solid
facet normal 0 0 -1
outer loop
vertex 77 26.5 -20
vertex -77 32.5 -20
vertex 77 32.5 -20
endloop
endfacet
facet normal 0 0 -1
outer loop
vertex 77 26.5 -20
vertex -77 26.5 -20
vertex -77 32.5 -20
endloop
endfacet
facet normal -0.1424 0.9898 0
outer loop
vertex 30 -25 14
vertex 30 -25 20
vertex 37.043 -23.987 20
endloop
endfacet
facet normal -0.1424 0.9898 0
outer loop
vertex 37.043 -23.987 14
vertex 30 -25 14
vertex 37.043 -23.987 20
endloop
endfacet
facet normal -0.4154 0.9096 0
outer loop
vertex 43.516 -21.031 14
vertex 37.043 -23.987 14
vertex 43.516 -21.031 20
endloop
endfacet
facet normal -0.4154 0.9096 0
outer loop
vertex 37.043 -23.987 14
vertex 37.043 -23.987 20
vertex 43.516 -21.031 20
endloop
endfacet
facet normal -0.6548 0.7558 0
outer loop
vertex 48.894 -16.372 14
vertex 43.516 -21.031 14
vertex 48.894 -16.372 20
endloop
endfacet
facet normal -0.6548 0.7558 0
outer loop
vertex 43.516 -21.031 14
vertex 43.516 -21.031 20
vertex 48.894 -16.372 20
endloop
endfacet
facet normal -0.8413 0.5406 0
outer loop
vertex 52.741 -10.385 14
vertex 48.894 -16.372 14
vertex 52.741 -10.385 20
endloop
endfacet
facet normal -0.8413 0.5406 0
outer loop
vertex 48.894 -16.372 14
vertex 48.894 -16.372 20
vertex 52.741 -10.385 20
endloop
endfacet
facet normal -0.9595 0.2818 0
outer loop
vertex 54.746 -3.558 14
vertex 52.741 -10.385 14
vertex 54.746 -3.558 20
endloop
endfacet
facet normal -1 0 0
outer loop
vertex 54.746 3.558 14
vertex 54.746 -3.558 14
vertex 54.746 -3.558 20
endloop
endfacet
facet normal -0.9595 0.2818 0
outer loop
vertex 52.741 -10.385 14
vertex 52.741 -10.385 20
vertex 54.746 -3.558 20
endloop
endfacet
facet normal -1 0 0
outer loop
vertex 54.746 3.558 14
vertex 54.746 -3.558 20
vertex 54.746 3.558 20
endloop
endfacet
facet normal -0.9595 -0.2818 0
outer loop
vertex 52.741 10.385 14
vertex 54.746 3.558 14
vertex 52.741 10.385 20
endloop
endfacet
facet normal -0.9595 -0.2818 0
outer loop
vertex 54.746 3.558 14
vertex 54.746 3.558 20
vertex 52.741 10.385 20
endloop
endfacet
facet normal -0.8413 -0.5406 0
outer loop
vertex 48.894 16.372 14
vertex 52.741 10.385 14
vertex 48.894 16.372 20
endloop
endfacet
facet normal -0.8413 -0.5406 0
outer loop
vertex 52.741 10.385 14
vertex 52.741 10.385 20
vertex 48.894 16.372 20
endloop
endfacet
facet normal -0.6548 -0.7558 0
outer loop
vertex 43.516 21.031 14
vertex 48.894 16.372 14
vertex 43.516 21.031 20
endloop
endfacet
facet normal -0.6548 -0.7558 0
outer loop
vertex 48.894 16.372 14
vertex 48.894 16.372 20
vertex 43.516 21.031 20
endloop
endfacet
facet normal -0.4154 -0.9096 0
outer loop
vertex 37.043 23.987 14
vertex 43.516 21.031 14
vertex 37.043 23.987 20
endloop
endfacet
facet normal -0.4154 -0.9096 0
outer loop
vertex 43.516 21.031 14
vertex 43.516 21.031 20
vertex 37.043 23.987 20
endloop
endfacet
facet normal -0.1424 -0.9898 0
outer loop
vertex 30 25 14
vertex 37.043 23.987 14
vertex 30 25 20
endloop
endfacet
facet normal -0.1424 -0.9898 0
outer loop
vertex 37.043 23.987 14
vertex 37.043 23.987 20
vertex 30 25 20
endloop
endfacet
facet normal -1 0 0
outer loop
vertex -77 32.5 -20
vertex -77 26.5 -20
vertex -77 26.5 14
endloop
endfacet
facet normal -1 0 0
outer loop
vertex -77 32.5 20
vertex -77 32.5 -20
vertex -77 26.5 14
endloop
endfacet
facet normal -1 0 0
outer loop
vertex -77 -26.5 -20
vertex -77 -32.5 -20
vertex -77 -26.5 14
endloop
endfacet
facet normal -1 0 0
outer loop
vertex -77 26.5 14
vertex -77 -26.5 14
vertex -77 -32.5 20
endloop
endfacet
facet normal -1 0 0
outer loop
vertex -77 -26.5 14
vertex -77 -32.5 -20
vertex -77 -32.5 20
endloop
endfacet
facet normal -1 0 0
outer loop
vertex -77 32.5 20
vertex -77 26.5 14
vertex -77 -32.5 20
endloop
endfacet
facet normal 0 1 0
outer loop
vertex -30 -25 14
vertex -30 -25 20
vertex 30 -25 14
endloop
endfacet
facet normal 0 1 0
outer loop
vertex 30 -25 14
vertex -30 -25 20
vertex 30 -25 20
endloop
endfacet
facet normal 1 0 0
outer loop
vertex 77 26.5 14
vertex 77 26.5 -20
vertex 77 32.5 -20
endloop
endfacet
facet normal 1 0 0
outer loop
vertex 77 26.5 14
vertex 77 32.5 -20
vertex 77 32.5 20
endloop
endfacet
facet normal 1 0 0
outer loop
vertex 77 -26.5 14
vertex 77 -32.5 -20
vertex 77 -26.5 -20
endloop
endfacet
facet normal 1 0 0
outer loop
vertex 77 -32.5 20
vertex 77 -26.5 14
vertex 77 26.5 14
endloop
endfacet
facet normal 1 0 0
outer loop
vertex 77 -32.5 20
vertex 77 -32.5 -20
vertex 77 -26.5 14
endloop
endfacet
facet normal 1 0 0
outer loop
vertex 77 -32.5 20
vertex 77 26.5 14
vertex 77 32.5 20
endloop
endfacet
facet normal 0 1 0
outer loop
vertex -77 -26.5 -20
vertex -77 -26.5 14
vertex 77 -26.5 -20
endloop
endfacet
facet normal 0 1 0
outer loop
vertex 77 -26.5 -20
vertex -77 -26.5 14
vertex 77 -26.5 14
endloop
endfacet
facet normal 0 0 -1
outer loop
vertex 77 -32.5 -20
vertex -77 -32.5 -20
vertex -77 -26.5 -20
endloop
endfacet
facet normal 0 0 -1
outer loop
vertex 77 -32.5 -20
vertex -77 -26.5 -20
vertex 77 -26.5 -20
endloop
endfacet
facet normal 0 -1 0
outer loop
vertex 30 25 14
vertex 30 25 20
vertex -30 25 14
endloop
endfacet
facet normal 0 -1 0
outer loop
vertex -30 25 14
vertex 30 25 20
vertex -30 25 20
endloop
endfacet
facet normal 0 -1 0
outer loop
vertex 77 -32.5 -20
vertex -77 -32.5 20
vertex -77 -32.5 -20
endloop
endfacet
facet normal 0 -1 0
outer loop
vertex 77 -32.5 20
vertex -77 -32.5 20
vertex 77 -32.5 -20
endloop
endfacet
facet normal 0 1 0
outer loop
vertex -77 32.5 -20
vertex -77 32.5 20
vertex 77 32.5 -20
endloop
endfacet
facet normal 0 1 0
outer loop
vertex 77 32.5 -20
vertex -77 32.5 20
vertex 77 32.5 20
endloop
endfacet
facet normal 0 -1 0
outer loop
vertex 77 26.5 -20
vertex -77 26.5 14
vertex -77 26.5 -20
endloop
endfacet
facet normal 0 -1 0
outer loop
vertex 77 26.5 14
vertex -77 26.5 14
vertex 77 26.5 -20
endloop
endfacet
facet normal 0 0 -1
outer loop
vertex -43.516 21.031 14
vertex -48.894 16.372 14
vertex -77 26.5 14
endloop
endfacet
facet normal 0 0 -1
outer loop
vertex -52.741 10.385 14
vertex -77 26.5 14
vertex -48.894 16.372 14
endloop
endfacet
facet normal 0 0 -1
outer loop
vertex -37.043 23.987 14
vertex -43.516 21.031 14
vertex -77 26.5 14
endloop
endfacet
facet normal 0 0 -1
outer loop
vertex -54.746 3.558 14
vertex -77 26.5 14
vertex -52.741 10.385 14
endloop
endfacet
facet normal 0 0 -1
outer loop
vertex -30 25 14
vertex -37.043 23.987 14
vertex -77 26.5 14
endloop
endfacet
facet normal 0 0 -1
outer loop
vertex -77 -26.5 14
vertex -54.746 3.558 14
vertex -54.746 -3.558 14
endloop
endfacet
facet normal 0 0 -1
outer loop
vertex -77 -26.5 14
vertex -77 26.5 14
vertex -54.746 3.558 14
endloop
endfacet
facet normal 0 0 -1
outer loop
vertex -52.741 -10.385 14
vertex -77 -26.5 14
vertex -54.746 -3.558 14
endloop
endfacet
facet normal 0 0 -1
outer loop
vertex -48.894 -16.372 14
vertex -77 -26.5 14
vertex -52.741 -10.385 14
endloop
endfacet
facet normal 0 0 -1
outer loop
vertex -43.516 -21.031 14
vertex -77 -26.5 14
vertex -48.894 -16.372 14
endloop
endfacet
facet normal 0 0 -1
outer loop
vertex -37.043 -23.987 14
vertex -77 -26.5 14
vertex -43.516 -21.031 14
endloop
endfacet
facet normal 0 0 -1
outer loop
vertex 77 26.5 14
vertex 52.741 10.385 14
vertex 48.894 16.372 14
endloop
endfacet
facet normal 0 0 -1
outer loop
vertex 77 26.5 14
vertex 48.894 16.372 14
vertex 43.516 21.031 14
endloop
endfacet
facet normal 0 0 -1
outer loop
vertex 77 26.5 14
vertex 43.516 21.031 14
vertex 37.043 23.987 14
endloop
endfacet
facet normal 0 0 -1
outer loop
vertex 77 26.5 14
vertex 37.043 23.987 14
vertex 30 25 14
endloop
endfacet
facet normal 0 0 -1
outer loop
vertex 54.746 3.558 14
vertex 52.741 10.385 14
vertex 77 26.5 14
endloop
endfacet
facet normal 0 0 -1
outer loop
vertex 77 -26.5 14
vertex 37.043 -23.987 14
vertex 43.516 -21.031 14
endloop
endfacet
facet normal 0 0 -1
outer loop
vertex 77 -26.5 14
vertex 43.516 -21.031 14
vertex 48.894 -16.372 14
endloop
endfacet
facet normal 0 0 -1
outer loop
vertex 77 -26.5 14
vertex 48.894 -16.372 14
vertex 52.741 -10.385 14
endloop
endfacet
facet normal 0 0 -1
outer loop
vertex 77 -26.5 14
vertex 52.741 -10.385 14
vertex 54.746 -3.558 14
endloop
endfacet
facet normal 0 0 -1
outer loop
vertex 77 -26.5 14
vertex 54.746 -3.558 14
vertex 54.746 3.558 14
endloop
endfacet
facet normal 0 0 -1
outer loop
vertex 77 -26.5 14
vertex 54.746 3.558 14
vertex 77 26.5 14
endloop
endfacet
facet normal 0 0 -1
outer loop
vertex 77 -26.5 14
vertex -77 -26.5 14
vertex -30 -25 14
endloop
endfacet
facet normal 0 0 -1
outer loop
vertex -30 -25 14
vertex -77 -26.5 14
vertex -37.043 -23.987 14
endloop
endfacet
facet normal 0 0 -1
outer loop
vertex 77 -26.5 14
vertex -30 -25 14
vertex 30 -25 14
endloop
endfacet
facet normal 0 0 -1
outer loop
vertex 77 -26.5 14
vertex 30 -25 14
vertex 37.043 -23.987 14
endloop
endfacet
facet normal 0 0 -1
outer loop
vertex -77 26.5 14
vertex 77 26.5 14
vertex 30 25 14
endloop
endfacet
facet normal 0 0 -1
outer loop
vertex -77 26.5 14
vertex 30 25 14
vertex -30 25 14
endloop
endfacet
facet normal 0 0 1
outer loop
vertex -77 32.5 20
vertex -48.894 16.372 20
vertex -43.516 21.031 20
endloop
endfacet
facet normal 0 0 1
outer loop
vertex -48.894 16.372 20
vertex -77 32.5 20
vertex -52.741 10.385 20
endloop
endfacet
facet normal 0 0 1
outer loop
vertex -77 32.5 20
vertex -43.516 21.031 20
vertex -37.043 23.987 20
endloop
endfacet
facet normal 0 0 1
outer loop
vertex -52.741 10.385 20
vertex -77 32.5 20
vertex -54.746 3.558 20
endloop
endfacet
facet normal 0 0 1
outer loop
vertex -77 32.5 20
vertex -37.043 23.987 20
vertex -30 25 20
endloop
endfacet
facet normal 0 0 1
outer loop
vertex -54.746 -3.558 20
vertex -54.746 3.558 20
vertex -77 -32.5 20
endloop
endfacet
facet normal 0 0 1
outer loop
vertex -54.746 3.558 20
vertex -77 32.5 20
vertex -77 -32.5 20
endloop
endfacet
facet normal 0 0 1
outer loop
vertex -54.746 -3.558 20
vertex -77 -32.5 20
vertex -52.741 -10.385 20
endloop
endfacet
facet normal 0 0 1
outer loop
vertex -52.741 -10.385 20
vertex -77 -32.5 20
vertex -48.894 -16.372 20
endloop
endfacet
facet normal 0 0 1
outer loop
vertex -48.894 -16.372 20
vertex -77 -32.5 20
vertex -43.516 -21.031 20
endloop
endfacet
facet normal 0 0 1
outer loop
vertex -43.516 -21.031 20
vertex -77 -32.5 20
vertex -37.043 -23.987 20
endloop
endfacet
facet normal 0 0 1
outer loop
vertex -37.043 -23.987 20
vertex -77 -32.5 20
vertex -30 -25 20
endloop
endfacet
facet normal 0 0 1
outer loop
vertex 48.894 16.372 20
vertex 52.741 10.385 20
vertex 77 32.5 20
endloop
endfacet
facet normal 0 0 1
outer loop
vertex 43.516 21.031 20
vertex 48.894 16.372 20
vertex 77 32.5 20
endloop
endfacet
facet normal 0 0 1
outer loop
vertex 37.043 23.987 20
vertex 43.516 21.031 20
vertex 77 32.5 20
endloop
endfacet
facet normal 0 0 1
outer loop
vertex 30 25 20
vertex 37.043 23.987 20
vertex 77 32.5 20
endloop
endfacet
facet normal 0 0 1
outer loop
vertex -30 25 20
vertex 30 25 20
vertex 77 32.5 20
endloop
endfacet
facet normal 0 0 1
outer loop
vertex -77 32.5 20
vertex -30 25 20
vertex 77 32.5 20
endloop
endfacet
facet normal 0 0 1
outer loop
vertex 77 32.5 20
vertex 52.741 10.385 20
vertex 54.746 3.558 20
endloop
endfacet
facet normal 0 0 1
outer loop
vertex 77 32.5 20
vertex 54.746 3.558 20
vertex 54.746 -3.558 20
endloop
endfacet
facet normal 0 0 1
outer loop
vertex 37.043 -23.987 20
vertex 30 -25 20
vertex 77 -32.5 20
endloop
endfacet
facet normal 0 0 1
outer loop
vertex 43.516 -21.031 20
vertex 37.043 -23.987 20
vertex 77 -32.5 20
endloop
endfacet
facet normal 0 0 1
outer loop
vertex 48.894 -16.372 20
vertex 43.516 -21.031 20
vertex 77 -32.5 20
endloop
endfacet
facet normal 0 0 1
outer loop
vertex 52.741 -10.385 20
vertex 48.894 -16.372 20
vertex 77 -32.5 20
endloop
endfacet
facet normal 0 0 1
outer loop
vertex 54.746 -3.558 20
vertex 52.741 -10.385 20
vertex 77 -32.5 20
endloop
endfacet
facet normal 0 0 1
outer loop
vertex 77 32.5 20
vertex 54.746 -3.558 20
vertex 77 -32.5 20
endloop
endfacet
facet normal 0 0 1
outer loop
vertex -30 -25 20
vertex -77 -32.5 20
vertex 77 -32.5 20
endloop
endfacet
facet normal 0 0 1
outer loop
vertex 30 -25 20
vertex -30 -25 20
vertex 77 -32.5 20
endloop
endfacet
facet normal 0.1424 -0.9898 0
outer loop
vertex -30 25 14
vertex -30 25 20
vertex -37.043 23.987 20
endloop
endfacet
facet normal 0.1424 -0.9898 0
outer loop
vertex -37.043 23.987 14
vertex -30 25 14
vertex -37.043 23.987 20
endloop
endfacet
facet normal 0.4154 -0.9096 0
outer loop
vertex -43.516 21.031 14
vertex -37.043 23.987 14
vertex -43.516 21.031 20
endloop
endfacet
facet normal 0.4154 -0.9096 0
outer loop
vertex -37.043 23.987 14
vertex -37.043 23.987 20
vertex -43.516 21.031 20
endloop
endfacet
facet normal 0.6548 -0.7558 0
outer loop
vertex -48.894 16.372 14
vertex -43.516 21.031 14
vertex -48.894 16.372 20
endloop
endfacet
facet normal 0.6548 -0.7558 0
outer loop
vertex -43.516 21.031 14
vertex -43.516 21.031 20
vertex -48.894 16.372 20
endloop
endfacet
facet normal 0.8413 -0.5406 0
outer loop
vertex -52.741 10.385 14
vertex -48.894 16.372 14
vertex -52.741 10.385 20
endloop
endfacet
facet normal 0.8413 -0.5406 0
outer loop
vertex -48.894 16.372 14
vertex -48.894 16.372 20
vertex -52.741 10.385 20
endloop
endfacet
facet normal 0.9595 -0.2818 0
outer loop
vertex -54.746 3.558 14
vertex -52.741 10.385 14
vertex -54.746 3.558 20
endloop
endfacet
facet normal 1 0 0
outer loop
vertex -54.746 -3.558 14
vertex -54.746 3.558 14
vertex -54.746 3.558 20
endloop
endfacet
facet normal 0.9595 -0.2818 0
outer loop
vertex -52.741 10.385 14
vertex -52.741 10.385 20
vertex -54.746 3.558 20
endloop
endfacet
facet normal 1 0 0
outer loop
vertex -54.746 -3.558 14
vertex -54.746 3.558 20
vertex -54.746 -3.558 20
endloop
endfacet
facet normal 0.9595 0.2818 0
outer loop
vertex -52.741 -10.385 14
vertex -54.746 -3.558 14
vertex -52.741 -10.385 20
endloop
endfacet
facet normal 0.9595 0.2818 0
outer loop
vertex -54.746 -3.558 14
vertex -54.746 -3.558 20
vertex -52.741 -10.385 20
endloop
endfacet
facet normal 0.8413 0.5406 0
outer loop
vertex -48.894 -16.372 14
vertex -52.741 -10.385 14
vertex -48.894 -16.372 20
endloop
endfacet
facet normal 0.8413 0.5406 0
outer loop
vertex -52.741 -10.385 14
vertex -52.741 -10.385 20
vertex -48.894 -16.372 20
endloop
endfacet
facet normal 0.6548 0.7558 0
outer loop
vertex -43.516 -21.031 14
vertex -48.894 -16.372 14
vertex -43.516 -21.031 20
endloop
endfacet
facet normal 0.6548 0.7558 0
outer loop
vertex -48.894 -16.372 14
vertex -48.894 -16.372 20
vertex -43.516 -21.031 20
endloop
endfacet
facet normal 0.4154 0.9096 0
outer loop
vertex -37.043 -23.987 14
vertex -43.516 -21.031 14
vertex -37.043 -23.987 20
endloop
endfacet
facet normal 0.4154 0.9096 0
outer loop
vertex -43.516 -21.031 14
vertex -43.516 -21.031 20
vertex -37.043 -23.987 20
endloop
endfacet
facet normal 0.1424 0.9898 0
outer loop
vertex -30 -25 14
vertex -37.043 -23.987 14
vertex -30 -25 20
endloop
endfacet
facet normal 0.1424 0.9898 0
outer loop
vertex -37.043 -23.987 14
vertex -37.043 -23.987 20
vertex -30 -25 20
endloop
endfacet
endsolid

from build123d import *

# Parameters (mm, degrees)
F0_W     = 154
F0_H     = 40
F1_DEPTH = 32.5
F2_T     = -6
F4_DEPTH = 7


with BuildPart() as f1:
    # F0 (on Front) → F1 (new body, symmetric)
    with BuildSketch(Plane.XZ):
        Rectangle(F0_W, F0_H)
    extrude(amount=F1_DEPTH, both=True)

    # F2
    f2_openings = [f1.faces().sort_by_distance(p)[0] for p in [
        (0, 0, -20),
        (-77, 0, 0),
        (77, 0, 0),
    ]]
    offset(amount=F2_T, openings=f2_openings)

    # F3 (on face) → F4 (cut)
    with BuildSketch(Plane.XY.offset(20)):
        with BuildLine():
            Line((30, 25), (-30, 25))
            ThreePointArc((-30, 25), (-55, 0), (-30, -25))
            Line((-30, -25), (30, -25))
            ThreePointArc((30, -25), (55, 0), (30, 25))
        make_face()
    extrude(amount=-F4_DEPTH, mode=Mode.SUBTRACT)


solid = f1.part
